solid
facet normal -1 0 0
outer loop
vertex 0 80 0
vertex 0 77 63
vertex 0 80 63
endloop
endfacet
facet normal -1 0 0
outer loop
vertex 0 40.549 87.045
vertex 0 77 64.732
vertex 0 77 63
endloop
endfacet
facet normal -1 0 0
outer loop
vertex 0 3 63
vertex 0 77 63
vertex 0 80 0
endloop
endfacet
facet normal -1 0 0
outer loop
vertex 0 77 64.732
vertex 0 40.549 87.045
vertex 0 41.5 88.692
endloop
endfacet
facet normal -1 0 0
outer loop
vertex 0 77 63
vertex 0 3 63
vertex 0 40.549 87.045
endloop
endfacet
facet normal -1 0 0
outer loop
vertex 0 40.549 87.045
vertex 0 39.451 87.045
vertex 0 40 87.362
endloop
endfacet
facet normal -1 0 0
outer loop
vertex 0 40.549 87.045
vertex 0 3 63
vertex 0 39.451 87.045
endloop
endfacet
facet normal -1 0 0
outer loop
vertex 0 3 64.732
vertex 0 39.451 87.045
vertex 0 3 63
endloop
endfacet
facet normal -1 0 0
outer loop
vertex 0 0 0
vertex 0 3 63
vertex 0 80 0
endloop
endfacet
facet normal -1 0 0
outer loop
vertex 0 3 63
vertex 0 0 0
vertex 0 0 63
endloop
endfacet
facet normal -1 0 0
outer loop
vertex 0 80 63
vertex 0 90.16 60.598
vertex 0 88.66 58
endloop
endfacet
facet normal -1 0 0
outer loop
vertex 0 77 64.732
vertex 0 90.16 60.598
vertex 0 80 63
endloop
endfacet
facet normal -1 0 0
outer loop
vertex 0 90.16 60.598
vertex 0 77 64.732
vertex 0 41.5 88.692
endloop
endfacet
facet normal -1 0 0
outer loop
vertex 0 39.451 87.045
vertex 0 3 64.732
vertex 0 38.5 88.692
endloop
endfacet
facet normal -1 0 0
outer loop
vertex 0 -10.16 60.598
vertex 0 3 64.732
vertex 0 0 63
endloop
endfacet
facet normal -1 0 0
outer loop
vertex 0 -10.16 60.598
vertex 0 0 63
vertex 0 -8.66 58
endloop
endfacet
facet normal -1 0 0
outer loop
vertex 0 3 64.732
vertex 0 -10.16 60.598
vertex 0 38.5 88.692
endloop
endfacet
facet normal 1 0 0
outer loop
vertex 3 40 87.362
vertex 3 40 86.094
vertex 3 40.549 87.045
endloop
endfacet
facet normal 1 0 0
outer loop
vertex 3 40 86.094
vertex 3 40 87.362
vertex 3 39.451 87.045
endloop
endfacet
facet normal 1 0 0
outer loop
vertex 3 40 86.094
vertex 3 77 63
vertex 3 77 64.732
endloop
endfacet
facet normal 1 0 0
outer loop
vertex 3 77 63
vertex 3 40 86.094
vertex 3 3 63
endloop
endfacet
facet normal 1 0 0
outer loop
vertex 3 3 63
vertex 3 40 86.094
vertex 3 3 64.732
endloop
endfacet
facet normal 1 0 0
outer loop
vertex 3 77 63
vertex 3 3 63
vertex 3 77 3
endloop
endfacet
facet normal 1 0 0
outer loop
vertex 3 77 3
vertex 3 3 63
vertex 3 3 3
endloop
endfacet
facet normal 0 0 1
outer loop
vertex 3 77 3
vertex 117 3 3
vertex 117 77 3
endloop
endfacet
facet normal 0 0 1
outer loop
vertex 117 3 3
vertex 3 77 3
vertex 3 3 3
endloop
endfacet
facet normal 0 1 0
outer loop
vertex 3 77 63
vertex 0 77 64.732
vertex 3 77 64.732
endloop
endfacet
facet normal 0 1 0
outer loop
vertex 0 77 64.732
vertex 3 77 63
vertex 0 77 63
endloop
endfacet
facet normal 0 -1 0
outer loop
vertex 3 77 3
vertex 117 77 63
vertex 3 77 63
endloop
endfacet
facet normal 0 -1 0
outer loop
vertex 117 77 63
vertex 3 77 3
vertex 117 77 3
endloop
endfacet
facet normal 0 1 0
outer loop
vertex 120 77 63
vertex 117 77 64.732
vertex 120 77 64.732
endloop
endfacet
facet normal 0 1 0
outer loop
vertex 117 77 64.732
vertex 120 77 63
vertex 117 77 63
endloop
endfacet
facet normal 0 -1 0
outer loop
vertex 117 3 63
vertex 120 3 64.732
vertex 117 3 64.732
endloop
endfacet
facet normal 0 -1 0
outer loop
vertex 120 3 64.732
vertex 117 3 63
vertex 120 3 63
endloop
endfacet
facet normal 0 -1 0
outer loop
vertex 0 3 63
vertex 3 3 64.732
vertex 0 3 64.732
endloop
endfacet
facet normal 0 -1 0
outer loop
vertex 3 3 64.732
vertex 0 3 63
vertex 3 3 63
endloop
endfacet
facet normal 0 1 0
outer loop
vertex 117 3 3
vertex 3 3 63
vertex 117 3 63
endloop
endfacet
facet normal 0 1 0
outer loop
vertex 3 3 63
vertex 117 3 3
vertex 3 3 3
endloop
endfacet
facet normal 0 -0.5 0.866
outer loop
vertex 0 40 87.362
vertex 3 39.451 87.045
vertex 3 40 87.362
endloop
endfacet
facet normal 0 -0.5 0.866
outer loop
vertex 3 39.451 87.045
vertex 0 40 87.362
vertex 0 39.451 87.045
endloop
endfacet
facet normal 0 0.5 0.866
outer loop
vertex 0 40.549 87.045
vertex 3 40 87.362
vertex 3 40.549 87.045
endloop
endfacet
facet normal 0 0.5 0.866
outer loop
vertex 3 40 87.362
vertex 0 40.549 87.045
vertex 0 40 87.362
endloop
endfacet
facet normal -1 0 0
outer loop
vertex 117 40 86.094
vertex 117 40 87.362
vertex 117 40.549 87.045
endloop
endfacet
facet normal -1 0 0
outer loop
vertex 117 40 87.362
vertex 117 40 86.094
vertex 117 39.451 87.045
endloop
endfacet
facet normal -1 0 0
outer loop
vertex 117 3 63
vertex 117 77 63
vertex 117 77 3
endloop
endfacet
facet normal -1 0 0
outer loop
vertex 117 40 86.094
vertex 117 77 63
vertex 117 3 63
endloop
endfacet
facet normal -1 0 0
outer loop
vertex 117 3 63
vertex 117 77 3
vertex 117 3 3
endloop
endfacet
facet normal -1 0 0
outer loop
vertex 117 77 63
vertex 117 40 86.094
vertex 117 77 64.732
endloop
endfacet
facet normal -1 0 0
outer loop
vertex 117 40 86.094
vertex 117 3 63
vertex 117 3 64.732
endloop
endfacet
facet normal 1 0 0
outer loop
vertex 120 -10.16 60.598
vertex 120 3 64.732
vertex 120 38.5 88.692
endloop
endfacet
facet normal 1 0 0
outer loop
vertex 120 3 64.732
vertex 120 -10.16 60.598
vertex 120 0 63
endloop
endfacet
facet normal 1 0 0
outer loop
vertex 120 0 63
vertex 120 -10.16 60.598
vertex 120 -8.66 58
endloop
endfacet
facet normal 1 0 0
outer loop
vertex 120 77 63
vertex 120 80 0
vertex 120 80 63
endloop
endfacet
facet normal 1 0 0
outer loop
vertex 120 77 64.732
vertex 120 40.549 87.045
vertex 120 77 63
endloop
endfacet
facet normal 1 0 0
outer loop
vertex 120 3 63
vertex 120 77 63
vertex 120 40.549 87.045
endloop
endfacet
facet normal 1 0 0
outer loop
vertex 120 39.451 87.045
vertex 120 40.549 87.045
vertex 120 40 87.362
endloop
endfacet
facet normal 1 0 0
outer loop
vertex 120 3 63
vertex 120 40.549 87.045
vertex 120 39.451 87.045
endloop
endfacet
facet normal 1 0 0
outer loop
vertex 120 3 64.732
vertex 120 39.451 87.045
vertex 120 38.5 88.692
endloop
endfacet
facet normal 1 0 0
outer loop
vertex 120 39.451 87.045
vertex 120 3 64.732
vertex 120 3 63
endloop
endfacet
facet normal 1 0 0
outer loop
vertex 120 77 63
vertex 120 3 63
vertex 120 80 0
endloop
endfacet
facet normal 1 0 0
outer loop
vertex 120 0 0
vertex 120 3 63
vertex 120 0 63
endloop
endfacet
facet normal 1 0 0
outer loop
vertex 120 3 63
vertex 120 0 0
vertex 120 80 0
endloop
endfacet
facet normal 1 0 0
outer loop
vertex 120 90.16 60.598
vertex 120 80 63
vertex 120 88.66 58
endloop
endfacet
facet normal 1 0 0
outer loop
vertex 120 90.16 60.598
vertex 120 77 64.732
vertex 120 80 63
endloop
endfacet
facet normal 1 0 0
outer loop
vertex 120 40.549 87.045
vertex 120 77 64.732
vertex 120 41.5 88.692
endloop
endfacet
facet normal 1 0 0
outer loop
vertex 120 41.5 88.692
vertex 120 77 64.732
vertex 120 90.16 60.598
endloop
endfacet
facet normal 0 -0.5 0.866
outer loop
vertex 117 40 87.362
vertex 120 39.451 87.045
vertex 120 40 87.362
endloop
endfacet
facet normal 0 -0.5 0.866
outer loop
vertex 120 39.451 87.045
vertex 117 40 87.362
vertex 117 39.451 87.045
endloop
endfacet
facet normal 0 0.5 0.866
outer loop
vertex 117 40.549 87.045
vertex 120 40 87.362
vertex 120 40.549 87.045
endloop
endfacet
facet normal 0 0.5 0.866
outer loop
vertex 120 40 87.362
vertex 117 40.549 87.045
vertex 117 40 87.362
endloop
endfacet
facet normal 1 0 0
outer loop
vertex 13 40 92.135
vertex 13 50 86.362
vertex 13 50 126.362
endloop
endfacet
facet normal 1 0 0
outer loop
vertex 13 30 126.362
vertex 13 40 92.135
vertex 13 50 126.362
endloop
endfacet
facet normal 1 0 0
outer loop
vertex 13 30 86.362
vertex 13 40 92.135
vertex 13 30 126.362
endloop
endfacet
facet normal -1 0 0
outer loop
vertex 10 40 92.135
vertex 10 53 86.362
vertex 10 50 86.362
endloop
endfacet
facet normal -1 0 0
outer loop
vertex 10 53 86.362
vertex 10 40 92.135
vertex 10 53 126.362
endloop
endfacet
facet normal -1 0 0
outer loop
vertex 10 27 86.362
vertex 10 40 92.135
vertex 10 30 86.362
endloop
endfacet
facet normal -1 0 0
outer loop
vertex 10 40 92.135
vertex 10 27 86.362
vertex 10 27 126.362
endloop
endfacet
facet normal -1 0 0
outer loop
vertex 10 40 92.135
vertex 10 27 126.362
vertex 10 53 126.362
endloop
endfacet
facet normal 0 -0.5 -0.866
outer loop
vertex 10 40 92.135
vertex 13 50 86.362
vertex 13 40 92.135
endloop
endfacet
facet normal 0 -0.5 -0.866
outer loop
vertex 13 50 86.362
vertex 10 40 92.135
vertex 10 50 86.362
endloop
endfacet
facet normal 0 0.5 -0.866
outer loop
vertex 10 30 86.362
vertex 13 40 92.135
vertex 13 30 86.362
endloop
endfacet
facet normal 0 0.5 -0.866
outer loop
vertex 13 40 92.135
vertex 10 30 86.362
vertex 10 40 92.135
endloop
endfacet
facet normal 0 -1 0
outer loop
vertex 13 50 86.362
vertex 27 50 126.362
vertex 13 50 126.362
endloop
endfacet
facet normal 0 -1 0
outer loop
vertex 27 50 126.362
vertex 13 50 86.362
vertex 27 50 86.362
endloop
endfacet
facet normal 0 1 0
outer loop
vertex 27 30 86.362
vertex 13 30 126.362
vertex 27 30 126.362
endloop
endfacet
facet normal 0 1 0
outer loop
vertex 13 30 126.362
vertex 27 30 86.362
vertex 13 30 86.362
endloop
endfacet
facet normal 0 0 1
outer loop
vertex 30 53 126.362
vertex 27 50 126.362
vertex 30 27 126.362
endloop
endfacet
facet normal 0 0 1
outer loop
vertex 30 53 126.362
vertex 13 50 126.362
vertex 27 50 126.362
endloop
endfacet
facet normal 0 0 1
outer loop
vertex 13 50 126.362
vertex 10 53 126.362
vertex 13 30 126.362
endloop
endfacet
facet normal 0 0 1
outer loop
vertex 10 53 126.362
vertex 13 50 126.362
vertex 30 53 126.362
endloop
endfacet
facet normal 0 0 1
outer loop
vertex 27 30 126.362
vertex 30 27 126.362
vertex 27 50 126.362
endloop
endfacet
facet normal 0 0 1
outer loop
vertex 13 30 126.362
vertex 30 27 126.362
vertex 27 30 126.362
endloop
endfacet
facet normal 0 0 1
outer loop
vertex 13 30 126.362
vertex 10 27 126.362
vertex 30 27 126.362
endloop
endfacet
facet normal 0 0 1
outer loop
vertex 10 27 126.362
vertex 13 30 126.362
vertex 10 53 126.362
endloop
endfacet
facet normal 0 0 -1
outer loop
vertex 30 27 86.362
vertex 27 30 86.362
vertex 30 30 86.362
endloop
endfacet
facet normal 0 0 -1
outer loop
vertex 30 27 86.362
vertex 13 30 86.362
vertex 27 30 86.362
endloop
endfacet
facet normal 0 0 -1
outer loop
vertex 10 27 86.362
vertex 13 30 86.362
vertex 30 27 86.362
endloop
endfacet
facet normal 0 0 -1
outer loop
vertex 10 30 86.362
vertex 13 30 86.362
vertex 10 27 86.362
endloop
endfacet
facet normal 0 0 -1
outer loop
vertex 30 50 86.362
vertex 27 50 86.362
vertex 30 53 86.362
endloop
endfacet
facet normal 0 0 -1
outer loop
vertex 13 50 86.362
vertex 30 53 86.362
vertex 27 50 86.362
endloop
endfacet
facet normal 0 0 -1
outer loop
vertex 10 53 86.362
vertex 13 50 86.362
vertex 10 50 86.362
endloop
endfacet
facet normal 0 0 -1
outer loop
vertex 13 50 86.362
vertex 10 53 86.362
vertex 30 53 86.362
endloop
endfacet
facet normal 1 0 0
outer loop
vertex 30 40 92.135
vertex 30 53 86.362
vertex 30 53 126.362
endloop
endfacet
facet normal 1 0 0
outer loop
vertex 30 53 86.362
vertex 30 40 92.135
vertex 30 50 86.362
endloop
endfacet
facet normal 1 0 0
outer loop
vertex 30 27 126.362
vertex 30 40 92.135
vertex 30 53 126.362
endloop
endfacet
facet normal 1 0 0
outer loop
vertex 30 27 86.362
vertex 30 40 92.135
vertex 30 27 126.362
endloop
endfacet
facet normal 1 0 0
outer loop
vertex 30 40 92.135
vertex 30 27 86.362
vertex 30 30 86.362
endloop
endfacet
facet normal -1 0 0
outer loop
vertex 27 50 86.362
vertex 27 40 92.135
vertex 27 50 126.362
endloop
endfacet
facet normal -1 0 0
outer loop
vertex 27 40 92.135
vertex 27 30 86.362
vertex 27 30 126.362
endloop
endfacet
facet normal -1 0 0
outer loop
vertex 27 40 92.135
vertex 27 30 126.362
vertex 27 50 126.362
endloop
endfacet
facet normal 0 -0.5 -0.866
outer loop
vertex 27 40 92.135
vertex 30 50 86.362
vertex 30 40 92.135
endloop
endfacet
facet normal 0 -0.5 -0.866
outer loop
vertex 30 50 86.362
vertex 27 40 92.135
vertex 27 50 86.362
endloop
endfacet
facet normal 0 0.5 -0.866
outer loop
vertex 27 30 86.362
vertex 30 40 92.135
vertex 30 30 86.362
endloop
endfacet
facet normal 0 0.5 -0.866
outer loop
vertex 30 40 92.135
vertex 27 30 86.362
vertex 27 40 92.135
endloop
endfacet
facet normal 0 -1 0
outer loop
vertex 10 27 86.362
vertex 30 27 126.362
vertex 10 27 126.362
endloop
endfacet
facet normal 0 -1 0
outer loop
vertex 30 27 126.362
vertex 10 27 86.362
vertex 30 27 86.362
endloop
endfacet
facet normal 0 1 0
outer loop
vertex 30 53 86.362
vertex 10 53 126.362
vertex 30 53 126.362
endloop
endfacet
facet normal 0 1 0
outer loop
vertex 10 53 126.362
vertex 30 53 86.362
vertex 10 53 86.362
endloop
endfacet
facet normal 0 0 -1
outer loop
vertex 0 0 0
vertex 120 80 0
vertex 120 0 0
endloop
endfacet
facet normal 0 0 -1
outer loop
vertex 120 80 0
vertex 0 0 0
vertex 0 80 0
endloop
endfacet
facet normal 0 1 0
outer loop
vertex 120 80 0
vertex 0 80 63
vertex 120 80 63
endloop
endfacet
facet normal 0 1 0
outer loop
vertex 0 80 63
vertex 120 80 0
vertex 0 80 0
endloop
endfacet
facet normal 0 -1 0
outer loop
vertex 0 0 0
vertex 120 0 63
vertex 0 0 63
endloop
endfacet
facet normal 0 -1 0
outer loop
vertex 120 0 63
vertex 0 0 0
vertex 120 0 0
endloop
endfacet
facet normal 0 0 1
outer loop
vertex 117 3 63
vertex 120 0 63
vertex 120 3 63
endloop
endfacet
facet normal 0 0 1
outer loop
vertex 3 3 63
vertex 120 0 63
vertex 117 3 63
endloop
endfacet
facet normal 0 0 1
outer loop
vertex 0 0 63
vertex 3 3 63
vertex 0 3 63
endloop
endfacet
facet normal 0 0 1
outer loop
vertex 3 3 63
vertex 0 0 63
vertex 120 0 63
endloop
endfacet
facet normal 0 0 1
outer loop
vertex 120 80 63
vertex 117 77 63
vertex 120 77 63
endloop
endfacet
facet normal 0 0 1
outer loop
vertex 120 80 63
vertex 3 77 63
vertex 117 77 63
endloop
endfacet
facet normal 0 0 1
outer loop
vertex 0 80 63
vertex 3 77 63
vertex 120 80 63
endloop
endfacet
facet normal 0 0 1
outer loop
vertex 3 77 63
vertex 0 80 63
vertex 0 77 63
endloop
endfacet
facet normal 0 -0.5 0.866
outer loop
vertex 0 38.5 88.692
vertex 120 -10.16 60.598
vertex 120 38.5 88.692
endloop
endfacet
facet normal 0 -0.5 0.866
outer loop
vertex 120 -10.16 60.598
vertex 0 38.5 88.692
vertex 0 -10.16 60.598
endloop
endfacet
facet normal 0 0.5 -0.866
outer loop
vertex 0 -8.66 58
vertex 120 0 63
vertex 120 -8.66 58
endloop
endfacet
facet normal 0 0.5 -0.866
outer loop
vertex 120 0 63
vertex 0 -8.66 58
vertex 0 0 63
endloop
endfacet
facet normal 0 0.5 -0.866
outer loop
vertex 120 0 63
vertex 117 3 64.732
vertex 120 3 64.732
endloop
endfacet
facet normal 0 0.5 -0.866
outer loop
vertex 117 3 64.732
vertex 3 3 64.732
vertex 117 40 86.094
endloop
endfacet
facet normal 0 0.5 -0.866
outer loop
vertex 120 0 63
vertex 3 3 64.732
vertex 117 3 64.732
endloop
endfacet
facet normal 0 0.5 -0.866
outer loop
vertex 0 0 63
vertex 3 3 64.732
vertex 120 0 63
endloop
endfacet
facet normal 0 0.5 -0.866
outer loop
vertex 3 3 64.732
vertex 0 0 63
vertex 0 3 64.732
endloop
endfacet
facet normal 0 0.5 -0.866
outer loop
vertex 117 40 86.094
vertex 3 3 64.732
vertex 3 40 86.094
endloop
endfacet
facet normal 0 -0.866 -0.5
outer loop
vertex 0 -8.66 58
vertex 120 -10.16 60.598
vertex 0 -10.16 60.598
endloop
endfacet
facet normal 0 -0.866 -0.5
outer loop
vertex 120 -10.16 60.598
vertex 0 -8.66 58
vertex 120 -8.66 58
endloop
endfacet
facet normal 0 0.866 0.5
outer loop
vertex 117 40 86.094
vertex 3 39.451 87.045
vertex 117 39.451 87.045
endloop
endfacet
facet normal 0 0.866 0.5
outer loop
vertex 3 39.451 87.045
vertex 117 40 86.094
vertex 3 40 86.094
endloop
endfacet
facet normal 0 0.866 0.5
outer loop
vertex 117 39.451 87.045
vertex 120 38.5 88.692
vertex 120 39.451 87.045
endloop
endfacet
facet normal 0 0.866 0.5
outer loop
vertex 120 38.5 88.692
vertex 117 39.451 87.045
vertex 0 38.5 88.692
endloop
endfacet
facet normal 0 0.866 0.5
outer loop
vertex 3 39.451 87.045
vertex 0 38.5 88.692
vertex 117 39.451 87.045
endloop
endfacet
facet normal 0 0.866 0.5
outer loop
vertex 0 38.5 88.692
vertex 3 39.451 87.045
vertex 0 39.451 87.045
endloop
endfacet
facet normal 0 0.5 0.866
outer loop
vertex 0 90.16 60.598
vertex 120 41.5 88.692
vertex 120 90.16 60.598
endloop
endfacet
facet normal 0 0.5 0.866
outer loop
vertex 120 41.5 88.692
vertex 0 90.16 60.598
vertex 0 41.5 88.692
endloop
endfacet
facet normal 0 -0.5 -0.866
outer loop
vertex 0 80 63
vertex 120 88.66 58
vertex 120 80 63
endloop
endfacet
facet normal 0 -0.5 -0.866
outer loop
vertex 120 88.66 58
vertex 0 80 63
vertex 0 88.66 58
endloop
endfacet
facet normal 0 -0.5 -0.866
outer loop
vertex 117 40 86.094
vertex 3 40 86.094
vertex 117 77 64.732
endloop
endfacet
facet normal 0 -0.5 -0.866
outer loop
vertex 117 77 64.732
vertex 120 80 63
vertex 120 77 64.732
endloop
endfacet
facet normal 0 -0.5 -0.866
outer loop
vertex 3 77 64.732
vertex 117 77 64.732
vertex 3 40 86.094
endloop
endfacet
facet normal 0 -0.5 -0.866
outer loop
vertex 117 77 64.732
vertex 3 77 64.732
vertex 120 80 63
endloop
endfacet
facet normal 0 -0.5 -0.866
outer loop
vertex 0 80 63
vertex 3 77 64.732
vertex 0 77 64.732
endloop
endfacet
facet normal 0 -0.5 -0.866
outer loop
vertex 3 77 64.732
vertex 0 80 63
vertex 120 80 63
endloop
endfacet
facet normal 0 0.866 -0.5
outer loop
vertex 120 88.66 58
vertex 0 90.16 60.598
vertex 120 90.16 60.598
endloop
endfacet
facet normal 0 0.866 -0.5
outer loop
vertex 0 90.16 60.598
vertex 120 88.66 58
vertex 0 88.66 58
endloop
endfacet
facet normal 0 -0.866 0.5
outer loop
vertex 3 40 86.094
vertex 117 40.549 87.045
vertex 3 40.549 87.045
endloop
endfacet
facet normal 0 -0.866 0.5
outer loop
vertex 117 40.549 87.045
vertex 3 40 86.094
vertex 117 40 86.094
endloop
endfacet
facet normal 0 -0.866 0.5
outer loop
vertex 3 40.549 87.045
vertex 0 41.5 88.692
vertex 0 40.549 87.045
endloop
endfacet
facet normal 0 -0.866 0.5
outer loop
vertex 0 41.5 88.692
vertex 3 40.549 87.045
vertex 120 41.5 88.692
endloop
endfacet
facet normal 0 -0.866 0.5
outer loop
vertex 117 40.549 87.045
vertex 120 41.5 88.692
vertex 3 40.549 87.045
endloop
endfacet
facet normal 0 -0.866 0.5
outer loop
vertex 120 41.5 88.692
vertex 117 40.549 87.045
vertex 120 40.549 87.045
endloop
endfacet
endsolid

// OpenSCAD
base_x = 120;
base_y = 80;

roof_angle = 30;
roof_height = 60;
eave = 10;
roof_run = (base_y/2)/cos(roof_angle)+eave;
wt = 3;

chimney_xy = 20;
chimney_z = 40;
end_y = base_y-2*wt;
gable_z = tan(roof_angle)*(end_y/2);
kerf = 0.1;

module base() {
    cube([base_x, base_y, wt]);
}
// base();

module side() {
    cube([base_x, roof_height, wt]);
}
module end() {
    cube([roof_height+wt, end_y, wt]);
    translate([roof_height+wt,0,0]) linear_extrude(wt) polygon([[0,0],[gable_z,end_y/2],[0,end_y]]);
}
// !end();
module roof() {
    cube([base_x,roof_run , wt]);
}
// !roof();

module chimney_front() {
    cube([chimney_xy, chimney_z, wt]);
}
// chimney_front();
module chimney_side() {
    difference() {
        cube([chimney_xy, chimney_z, wt]);
        translate([base_y/2-wt+chimney_xy/2,-roof_height-wt-gable_z+tan(roof_angle)*(chimney_xy/2),0]) rotate([0,0,90]) end();
    }
}
// chimney_side();
module chimney() {
    rotate([90,0,0]) chimney_front();
    translate([0,chimney_xy+wt,0]) rotate([90,0,0]) chimney_front();
    rotate([90,0,90]) chimney_side();
    translate([chimney_xy-wt,0,0]) rotate([90,0,90]) chimney_side();
}
// !chimney();
module assembled() {
    base();
    translate([0,wt,wt]) rotate([90,0,0]) side();
    translate([0,base_y,wt]) rotate([90,0,0]) side();
    translate([wt,wt,wt]) rotate([0,-90,0]) end();
    translate([base_x,wt,wt]) rotate([0,-90,0]) end();
    translate([0,0,roof_height+wt]) rotate([roof_angle,0,0]) translate([0,-eave,0]) roof();
    translate([0,base_y,roof_height+wt]) rotate([-roof_angle,0,0]) translate([0,eave-roof_run,0]) roof();
    translate([10, base_y/2-chimney_xy/2, roof_height+gable_z+5]) chimney();

}
module arranged(){
    projection() {
        side();
        translate([0,roof_height+kerf,0]) side();
        translate([base_x+kerf,0,0]) roof();
        translate([base_x+kerf,roof_run+kerf,0]) roof();

        translate([chimney_z,(roof_height+kerf)*2,0]) rotate([0,0,90]) union() {
            chimney_front();
            translate([0,-chimney_z-kerf,0]) chimney_front();
            translate([0,(-chimney_z-kerf)*2,0]) chimney_side();
            translate([0,(-chimney_z-kerf)*3,0]) chimney_side();
        }

        translate([base_y-wt*2,(roof_height+kerf)*2+chimney_xy+kerf,0]) rotate([0,0,90]) end();
        translate([(base_y-wt*2)*2+kerf,(roof_height+kerf)*2+chimney_xy+kerf,0]) rotate([0,0,90]) #end();

        translate([base_y+(base_y-wt*2+kerf)*2,(roof_height+kerf)*2+chimney_xy+kerf,0]) rotate([0,0,90]) base();

    }
}
// !arranged();
!assembled();
